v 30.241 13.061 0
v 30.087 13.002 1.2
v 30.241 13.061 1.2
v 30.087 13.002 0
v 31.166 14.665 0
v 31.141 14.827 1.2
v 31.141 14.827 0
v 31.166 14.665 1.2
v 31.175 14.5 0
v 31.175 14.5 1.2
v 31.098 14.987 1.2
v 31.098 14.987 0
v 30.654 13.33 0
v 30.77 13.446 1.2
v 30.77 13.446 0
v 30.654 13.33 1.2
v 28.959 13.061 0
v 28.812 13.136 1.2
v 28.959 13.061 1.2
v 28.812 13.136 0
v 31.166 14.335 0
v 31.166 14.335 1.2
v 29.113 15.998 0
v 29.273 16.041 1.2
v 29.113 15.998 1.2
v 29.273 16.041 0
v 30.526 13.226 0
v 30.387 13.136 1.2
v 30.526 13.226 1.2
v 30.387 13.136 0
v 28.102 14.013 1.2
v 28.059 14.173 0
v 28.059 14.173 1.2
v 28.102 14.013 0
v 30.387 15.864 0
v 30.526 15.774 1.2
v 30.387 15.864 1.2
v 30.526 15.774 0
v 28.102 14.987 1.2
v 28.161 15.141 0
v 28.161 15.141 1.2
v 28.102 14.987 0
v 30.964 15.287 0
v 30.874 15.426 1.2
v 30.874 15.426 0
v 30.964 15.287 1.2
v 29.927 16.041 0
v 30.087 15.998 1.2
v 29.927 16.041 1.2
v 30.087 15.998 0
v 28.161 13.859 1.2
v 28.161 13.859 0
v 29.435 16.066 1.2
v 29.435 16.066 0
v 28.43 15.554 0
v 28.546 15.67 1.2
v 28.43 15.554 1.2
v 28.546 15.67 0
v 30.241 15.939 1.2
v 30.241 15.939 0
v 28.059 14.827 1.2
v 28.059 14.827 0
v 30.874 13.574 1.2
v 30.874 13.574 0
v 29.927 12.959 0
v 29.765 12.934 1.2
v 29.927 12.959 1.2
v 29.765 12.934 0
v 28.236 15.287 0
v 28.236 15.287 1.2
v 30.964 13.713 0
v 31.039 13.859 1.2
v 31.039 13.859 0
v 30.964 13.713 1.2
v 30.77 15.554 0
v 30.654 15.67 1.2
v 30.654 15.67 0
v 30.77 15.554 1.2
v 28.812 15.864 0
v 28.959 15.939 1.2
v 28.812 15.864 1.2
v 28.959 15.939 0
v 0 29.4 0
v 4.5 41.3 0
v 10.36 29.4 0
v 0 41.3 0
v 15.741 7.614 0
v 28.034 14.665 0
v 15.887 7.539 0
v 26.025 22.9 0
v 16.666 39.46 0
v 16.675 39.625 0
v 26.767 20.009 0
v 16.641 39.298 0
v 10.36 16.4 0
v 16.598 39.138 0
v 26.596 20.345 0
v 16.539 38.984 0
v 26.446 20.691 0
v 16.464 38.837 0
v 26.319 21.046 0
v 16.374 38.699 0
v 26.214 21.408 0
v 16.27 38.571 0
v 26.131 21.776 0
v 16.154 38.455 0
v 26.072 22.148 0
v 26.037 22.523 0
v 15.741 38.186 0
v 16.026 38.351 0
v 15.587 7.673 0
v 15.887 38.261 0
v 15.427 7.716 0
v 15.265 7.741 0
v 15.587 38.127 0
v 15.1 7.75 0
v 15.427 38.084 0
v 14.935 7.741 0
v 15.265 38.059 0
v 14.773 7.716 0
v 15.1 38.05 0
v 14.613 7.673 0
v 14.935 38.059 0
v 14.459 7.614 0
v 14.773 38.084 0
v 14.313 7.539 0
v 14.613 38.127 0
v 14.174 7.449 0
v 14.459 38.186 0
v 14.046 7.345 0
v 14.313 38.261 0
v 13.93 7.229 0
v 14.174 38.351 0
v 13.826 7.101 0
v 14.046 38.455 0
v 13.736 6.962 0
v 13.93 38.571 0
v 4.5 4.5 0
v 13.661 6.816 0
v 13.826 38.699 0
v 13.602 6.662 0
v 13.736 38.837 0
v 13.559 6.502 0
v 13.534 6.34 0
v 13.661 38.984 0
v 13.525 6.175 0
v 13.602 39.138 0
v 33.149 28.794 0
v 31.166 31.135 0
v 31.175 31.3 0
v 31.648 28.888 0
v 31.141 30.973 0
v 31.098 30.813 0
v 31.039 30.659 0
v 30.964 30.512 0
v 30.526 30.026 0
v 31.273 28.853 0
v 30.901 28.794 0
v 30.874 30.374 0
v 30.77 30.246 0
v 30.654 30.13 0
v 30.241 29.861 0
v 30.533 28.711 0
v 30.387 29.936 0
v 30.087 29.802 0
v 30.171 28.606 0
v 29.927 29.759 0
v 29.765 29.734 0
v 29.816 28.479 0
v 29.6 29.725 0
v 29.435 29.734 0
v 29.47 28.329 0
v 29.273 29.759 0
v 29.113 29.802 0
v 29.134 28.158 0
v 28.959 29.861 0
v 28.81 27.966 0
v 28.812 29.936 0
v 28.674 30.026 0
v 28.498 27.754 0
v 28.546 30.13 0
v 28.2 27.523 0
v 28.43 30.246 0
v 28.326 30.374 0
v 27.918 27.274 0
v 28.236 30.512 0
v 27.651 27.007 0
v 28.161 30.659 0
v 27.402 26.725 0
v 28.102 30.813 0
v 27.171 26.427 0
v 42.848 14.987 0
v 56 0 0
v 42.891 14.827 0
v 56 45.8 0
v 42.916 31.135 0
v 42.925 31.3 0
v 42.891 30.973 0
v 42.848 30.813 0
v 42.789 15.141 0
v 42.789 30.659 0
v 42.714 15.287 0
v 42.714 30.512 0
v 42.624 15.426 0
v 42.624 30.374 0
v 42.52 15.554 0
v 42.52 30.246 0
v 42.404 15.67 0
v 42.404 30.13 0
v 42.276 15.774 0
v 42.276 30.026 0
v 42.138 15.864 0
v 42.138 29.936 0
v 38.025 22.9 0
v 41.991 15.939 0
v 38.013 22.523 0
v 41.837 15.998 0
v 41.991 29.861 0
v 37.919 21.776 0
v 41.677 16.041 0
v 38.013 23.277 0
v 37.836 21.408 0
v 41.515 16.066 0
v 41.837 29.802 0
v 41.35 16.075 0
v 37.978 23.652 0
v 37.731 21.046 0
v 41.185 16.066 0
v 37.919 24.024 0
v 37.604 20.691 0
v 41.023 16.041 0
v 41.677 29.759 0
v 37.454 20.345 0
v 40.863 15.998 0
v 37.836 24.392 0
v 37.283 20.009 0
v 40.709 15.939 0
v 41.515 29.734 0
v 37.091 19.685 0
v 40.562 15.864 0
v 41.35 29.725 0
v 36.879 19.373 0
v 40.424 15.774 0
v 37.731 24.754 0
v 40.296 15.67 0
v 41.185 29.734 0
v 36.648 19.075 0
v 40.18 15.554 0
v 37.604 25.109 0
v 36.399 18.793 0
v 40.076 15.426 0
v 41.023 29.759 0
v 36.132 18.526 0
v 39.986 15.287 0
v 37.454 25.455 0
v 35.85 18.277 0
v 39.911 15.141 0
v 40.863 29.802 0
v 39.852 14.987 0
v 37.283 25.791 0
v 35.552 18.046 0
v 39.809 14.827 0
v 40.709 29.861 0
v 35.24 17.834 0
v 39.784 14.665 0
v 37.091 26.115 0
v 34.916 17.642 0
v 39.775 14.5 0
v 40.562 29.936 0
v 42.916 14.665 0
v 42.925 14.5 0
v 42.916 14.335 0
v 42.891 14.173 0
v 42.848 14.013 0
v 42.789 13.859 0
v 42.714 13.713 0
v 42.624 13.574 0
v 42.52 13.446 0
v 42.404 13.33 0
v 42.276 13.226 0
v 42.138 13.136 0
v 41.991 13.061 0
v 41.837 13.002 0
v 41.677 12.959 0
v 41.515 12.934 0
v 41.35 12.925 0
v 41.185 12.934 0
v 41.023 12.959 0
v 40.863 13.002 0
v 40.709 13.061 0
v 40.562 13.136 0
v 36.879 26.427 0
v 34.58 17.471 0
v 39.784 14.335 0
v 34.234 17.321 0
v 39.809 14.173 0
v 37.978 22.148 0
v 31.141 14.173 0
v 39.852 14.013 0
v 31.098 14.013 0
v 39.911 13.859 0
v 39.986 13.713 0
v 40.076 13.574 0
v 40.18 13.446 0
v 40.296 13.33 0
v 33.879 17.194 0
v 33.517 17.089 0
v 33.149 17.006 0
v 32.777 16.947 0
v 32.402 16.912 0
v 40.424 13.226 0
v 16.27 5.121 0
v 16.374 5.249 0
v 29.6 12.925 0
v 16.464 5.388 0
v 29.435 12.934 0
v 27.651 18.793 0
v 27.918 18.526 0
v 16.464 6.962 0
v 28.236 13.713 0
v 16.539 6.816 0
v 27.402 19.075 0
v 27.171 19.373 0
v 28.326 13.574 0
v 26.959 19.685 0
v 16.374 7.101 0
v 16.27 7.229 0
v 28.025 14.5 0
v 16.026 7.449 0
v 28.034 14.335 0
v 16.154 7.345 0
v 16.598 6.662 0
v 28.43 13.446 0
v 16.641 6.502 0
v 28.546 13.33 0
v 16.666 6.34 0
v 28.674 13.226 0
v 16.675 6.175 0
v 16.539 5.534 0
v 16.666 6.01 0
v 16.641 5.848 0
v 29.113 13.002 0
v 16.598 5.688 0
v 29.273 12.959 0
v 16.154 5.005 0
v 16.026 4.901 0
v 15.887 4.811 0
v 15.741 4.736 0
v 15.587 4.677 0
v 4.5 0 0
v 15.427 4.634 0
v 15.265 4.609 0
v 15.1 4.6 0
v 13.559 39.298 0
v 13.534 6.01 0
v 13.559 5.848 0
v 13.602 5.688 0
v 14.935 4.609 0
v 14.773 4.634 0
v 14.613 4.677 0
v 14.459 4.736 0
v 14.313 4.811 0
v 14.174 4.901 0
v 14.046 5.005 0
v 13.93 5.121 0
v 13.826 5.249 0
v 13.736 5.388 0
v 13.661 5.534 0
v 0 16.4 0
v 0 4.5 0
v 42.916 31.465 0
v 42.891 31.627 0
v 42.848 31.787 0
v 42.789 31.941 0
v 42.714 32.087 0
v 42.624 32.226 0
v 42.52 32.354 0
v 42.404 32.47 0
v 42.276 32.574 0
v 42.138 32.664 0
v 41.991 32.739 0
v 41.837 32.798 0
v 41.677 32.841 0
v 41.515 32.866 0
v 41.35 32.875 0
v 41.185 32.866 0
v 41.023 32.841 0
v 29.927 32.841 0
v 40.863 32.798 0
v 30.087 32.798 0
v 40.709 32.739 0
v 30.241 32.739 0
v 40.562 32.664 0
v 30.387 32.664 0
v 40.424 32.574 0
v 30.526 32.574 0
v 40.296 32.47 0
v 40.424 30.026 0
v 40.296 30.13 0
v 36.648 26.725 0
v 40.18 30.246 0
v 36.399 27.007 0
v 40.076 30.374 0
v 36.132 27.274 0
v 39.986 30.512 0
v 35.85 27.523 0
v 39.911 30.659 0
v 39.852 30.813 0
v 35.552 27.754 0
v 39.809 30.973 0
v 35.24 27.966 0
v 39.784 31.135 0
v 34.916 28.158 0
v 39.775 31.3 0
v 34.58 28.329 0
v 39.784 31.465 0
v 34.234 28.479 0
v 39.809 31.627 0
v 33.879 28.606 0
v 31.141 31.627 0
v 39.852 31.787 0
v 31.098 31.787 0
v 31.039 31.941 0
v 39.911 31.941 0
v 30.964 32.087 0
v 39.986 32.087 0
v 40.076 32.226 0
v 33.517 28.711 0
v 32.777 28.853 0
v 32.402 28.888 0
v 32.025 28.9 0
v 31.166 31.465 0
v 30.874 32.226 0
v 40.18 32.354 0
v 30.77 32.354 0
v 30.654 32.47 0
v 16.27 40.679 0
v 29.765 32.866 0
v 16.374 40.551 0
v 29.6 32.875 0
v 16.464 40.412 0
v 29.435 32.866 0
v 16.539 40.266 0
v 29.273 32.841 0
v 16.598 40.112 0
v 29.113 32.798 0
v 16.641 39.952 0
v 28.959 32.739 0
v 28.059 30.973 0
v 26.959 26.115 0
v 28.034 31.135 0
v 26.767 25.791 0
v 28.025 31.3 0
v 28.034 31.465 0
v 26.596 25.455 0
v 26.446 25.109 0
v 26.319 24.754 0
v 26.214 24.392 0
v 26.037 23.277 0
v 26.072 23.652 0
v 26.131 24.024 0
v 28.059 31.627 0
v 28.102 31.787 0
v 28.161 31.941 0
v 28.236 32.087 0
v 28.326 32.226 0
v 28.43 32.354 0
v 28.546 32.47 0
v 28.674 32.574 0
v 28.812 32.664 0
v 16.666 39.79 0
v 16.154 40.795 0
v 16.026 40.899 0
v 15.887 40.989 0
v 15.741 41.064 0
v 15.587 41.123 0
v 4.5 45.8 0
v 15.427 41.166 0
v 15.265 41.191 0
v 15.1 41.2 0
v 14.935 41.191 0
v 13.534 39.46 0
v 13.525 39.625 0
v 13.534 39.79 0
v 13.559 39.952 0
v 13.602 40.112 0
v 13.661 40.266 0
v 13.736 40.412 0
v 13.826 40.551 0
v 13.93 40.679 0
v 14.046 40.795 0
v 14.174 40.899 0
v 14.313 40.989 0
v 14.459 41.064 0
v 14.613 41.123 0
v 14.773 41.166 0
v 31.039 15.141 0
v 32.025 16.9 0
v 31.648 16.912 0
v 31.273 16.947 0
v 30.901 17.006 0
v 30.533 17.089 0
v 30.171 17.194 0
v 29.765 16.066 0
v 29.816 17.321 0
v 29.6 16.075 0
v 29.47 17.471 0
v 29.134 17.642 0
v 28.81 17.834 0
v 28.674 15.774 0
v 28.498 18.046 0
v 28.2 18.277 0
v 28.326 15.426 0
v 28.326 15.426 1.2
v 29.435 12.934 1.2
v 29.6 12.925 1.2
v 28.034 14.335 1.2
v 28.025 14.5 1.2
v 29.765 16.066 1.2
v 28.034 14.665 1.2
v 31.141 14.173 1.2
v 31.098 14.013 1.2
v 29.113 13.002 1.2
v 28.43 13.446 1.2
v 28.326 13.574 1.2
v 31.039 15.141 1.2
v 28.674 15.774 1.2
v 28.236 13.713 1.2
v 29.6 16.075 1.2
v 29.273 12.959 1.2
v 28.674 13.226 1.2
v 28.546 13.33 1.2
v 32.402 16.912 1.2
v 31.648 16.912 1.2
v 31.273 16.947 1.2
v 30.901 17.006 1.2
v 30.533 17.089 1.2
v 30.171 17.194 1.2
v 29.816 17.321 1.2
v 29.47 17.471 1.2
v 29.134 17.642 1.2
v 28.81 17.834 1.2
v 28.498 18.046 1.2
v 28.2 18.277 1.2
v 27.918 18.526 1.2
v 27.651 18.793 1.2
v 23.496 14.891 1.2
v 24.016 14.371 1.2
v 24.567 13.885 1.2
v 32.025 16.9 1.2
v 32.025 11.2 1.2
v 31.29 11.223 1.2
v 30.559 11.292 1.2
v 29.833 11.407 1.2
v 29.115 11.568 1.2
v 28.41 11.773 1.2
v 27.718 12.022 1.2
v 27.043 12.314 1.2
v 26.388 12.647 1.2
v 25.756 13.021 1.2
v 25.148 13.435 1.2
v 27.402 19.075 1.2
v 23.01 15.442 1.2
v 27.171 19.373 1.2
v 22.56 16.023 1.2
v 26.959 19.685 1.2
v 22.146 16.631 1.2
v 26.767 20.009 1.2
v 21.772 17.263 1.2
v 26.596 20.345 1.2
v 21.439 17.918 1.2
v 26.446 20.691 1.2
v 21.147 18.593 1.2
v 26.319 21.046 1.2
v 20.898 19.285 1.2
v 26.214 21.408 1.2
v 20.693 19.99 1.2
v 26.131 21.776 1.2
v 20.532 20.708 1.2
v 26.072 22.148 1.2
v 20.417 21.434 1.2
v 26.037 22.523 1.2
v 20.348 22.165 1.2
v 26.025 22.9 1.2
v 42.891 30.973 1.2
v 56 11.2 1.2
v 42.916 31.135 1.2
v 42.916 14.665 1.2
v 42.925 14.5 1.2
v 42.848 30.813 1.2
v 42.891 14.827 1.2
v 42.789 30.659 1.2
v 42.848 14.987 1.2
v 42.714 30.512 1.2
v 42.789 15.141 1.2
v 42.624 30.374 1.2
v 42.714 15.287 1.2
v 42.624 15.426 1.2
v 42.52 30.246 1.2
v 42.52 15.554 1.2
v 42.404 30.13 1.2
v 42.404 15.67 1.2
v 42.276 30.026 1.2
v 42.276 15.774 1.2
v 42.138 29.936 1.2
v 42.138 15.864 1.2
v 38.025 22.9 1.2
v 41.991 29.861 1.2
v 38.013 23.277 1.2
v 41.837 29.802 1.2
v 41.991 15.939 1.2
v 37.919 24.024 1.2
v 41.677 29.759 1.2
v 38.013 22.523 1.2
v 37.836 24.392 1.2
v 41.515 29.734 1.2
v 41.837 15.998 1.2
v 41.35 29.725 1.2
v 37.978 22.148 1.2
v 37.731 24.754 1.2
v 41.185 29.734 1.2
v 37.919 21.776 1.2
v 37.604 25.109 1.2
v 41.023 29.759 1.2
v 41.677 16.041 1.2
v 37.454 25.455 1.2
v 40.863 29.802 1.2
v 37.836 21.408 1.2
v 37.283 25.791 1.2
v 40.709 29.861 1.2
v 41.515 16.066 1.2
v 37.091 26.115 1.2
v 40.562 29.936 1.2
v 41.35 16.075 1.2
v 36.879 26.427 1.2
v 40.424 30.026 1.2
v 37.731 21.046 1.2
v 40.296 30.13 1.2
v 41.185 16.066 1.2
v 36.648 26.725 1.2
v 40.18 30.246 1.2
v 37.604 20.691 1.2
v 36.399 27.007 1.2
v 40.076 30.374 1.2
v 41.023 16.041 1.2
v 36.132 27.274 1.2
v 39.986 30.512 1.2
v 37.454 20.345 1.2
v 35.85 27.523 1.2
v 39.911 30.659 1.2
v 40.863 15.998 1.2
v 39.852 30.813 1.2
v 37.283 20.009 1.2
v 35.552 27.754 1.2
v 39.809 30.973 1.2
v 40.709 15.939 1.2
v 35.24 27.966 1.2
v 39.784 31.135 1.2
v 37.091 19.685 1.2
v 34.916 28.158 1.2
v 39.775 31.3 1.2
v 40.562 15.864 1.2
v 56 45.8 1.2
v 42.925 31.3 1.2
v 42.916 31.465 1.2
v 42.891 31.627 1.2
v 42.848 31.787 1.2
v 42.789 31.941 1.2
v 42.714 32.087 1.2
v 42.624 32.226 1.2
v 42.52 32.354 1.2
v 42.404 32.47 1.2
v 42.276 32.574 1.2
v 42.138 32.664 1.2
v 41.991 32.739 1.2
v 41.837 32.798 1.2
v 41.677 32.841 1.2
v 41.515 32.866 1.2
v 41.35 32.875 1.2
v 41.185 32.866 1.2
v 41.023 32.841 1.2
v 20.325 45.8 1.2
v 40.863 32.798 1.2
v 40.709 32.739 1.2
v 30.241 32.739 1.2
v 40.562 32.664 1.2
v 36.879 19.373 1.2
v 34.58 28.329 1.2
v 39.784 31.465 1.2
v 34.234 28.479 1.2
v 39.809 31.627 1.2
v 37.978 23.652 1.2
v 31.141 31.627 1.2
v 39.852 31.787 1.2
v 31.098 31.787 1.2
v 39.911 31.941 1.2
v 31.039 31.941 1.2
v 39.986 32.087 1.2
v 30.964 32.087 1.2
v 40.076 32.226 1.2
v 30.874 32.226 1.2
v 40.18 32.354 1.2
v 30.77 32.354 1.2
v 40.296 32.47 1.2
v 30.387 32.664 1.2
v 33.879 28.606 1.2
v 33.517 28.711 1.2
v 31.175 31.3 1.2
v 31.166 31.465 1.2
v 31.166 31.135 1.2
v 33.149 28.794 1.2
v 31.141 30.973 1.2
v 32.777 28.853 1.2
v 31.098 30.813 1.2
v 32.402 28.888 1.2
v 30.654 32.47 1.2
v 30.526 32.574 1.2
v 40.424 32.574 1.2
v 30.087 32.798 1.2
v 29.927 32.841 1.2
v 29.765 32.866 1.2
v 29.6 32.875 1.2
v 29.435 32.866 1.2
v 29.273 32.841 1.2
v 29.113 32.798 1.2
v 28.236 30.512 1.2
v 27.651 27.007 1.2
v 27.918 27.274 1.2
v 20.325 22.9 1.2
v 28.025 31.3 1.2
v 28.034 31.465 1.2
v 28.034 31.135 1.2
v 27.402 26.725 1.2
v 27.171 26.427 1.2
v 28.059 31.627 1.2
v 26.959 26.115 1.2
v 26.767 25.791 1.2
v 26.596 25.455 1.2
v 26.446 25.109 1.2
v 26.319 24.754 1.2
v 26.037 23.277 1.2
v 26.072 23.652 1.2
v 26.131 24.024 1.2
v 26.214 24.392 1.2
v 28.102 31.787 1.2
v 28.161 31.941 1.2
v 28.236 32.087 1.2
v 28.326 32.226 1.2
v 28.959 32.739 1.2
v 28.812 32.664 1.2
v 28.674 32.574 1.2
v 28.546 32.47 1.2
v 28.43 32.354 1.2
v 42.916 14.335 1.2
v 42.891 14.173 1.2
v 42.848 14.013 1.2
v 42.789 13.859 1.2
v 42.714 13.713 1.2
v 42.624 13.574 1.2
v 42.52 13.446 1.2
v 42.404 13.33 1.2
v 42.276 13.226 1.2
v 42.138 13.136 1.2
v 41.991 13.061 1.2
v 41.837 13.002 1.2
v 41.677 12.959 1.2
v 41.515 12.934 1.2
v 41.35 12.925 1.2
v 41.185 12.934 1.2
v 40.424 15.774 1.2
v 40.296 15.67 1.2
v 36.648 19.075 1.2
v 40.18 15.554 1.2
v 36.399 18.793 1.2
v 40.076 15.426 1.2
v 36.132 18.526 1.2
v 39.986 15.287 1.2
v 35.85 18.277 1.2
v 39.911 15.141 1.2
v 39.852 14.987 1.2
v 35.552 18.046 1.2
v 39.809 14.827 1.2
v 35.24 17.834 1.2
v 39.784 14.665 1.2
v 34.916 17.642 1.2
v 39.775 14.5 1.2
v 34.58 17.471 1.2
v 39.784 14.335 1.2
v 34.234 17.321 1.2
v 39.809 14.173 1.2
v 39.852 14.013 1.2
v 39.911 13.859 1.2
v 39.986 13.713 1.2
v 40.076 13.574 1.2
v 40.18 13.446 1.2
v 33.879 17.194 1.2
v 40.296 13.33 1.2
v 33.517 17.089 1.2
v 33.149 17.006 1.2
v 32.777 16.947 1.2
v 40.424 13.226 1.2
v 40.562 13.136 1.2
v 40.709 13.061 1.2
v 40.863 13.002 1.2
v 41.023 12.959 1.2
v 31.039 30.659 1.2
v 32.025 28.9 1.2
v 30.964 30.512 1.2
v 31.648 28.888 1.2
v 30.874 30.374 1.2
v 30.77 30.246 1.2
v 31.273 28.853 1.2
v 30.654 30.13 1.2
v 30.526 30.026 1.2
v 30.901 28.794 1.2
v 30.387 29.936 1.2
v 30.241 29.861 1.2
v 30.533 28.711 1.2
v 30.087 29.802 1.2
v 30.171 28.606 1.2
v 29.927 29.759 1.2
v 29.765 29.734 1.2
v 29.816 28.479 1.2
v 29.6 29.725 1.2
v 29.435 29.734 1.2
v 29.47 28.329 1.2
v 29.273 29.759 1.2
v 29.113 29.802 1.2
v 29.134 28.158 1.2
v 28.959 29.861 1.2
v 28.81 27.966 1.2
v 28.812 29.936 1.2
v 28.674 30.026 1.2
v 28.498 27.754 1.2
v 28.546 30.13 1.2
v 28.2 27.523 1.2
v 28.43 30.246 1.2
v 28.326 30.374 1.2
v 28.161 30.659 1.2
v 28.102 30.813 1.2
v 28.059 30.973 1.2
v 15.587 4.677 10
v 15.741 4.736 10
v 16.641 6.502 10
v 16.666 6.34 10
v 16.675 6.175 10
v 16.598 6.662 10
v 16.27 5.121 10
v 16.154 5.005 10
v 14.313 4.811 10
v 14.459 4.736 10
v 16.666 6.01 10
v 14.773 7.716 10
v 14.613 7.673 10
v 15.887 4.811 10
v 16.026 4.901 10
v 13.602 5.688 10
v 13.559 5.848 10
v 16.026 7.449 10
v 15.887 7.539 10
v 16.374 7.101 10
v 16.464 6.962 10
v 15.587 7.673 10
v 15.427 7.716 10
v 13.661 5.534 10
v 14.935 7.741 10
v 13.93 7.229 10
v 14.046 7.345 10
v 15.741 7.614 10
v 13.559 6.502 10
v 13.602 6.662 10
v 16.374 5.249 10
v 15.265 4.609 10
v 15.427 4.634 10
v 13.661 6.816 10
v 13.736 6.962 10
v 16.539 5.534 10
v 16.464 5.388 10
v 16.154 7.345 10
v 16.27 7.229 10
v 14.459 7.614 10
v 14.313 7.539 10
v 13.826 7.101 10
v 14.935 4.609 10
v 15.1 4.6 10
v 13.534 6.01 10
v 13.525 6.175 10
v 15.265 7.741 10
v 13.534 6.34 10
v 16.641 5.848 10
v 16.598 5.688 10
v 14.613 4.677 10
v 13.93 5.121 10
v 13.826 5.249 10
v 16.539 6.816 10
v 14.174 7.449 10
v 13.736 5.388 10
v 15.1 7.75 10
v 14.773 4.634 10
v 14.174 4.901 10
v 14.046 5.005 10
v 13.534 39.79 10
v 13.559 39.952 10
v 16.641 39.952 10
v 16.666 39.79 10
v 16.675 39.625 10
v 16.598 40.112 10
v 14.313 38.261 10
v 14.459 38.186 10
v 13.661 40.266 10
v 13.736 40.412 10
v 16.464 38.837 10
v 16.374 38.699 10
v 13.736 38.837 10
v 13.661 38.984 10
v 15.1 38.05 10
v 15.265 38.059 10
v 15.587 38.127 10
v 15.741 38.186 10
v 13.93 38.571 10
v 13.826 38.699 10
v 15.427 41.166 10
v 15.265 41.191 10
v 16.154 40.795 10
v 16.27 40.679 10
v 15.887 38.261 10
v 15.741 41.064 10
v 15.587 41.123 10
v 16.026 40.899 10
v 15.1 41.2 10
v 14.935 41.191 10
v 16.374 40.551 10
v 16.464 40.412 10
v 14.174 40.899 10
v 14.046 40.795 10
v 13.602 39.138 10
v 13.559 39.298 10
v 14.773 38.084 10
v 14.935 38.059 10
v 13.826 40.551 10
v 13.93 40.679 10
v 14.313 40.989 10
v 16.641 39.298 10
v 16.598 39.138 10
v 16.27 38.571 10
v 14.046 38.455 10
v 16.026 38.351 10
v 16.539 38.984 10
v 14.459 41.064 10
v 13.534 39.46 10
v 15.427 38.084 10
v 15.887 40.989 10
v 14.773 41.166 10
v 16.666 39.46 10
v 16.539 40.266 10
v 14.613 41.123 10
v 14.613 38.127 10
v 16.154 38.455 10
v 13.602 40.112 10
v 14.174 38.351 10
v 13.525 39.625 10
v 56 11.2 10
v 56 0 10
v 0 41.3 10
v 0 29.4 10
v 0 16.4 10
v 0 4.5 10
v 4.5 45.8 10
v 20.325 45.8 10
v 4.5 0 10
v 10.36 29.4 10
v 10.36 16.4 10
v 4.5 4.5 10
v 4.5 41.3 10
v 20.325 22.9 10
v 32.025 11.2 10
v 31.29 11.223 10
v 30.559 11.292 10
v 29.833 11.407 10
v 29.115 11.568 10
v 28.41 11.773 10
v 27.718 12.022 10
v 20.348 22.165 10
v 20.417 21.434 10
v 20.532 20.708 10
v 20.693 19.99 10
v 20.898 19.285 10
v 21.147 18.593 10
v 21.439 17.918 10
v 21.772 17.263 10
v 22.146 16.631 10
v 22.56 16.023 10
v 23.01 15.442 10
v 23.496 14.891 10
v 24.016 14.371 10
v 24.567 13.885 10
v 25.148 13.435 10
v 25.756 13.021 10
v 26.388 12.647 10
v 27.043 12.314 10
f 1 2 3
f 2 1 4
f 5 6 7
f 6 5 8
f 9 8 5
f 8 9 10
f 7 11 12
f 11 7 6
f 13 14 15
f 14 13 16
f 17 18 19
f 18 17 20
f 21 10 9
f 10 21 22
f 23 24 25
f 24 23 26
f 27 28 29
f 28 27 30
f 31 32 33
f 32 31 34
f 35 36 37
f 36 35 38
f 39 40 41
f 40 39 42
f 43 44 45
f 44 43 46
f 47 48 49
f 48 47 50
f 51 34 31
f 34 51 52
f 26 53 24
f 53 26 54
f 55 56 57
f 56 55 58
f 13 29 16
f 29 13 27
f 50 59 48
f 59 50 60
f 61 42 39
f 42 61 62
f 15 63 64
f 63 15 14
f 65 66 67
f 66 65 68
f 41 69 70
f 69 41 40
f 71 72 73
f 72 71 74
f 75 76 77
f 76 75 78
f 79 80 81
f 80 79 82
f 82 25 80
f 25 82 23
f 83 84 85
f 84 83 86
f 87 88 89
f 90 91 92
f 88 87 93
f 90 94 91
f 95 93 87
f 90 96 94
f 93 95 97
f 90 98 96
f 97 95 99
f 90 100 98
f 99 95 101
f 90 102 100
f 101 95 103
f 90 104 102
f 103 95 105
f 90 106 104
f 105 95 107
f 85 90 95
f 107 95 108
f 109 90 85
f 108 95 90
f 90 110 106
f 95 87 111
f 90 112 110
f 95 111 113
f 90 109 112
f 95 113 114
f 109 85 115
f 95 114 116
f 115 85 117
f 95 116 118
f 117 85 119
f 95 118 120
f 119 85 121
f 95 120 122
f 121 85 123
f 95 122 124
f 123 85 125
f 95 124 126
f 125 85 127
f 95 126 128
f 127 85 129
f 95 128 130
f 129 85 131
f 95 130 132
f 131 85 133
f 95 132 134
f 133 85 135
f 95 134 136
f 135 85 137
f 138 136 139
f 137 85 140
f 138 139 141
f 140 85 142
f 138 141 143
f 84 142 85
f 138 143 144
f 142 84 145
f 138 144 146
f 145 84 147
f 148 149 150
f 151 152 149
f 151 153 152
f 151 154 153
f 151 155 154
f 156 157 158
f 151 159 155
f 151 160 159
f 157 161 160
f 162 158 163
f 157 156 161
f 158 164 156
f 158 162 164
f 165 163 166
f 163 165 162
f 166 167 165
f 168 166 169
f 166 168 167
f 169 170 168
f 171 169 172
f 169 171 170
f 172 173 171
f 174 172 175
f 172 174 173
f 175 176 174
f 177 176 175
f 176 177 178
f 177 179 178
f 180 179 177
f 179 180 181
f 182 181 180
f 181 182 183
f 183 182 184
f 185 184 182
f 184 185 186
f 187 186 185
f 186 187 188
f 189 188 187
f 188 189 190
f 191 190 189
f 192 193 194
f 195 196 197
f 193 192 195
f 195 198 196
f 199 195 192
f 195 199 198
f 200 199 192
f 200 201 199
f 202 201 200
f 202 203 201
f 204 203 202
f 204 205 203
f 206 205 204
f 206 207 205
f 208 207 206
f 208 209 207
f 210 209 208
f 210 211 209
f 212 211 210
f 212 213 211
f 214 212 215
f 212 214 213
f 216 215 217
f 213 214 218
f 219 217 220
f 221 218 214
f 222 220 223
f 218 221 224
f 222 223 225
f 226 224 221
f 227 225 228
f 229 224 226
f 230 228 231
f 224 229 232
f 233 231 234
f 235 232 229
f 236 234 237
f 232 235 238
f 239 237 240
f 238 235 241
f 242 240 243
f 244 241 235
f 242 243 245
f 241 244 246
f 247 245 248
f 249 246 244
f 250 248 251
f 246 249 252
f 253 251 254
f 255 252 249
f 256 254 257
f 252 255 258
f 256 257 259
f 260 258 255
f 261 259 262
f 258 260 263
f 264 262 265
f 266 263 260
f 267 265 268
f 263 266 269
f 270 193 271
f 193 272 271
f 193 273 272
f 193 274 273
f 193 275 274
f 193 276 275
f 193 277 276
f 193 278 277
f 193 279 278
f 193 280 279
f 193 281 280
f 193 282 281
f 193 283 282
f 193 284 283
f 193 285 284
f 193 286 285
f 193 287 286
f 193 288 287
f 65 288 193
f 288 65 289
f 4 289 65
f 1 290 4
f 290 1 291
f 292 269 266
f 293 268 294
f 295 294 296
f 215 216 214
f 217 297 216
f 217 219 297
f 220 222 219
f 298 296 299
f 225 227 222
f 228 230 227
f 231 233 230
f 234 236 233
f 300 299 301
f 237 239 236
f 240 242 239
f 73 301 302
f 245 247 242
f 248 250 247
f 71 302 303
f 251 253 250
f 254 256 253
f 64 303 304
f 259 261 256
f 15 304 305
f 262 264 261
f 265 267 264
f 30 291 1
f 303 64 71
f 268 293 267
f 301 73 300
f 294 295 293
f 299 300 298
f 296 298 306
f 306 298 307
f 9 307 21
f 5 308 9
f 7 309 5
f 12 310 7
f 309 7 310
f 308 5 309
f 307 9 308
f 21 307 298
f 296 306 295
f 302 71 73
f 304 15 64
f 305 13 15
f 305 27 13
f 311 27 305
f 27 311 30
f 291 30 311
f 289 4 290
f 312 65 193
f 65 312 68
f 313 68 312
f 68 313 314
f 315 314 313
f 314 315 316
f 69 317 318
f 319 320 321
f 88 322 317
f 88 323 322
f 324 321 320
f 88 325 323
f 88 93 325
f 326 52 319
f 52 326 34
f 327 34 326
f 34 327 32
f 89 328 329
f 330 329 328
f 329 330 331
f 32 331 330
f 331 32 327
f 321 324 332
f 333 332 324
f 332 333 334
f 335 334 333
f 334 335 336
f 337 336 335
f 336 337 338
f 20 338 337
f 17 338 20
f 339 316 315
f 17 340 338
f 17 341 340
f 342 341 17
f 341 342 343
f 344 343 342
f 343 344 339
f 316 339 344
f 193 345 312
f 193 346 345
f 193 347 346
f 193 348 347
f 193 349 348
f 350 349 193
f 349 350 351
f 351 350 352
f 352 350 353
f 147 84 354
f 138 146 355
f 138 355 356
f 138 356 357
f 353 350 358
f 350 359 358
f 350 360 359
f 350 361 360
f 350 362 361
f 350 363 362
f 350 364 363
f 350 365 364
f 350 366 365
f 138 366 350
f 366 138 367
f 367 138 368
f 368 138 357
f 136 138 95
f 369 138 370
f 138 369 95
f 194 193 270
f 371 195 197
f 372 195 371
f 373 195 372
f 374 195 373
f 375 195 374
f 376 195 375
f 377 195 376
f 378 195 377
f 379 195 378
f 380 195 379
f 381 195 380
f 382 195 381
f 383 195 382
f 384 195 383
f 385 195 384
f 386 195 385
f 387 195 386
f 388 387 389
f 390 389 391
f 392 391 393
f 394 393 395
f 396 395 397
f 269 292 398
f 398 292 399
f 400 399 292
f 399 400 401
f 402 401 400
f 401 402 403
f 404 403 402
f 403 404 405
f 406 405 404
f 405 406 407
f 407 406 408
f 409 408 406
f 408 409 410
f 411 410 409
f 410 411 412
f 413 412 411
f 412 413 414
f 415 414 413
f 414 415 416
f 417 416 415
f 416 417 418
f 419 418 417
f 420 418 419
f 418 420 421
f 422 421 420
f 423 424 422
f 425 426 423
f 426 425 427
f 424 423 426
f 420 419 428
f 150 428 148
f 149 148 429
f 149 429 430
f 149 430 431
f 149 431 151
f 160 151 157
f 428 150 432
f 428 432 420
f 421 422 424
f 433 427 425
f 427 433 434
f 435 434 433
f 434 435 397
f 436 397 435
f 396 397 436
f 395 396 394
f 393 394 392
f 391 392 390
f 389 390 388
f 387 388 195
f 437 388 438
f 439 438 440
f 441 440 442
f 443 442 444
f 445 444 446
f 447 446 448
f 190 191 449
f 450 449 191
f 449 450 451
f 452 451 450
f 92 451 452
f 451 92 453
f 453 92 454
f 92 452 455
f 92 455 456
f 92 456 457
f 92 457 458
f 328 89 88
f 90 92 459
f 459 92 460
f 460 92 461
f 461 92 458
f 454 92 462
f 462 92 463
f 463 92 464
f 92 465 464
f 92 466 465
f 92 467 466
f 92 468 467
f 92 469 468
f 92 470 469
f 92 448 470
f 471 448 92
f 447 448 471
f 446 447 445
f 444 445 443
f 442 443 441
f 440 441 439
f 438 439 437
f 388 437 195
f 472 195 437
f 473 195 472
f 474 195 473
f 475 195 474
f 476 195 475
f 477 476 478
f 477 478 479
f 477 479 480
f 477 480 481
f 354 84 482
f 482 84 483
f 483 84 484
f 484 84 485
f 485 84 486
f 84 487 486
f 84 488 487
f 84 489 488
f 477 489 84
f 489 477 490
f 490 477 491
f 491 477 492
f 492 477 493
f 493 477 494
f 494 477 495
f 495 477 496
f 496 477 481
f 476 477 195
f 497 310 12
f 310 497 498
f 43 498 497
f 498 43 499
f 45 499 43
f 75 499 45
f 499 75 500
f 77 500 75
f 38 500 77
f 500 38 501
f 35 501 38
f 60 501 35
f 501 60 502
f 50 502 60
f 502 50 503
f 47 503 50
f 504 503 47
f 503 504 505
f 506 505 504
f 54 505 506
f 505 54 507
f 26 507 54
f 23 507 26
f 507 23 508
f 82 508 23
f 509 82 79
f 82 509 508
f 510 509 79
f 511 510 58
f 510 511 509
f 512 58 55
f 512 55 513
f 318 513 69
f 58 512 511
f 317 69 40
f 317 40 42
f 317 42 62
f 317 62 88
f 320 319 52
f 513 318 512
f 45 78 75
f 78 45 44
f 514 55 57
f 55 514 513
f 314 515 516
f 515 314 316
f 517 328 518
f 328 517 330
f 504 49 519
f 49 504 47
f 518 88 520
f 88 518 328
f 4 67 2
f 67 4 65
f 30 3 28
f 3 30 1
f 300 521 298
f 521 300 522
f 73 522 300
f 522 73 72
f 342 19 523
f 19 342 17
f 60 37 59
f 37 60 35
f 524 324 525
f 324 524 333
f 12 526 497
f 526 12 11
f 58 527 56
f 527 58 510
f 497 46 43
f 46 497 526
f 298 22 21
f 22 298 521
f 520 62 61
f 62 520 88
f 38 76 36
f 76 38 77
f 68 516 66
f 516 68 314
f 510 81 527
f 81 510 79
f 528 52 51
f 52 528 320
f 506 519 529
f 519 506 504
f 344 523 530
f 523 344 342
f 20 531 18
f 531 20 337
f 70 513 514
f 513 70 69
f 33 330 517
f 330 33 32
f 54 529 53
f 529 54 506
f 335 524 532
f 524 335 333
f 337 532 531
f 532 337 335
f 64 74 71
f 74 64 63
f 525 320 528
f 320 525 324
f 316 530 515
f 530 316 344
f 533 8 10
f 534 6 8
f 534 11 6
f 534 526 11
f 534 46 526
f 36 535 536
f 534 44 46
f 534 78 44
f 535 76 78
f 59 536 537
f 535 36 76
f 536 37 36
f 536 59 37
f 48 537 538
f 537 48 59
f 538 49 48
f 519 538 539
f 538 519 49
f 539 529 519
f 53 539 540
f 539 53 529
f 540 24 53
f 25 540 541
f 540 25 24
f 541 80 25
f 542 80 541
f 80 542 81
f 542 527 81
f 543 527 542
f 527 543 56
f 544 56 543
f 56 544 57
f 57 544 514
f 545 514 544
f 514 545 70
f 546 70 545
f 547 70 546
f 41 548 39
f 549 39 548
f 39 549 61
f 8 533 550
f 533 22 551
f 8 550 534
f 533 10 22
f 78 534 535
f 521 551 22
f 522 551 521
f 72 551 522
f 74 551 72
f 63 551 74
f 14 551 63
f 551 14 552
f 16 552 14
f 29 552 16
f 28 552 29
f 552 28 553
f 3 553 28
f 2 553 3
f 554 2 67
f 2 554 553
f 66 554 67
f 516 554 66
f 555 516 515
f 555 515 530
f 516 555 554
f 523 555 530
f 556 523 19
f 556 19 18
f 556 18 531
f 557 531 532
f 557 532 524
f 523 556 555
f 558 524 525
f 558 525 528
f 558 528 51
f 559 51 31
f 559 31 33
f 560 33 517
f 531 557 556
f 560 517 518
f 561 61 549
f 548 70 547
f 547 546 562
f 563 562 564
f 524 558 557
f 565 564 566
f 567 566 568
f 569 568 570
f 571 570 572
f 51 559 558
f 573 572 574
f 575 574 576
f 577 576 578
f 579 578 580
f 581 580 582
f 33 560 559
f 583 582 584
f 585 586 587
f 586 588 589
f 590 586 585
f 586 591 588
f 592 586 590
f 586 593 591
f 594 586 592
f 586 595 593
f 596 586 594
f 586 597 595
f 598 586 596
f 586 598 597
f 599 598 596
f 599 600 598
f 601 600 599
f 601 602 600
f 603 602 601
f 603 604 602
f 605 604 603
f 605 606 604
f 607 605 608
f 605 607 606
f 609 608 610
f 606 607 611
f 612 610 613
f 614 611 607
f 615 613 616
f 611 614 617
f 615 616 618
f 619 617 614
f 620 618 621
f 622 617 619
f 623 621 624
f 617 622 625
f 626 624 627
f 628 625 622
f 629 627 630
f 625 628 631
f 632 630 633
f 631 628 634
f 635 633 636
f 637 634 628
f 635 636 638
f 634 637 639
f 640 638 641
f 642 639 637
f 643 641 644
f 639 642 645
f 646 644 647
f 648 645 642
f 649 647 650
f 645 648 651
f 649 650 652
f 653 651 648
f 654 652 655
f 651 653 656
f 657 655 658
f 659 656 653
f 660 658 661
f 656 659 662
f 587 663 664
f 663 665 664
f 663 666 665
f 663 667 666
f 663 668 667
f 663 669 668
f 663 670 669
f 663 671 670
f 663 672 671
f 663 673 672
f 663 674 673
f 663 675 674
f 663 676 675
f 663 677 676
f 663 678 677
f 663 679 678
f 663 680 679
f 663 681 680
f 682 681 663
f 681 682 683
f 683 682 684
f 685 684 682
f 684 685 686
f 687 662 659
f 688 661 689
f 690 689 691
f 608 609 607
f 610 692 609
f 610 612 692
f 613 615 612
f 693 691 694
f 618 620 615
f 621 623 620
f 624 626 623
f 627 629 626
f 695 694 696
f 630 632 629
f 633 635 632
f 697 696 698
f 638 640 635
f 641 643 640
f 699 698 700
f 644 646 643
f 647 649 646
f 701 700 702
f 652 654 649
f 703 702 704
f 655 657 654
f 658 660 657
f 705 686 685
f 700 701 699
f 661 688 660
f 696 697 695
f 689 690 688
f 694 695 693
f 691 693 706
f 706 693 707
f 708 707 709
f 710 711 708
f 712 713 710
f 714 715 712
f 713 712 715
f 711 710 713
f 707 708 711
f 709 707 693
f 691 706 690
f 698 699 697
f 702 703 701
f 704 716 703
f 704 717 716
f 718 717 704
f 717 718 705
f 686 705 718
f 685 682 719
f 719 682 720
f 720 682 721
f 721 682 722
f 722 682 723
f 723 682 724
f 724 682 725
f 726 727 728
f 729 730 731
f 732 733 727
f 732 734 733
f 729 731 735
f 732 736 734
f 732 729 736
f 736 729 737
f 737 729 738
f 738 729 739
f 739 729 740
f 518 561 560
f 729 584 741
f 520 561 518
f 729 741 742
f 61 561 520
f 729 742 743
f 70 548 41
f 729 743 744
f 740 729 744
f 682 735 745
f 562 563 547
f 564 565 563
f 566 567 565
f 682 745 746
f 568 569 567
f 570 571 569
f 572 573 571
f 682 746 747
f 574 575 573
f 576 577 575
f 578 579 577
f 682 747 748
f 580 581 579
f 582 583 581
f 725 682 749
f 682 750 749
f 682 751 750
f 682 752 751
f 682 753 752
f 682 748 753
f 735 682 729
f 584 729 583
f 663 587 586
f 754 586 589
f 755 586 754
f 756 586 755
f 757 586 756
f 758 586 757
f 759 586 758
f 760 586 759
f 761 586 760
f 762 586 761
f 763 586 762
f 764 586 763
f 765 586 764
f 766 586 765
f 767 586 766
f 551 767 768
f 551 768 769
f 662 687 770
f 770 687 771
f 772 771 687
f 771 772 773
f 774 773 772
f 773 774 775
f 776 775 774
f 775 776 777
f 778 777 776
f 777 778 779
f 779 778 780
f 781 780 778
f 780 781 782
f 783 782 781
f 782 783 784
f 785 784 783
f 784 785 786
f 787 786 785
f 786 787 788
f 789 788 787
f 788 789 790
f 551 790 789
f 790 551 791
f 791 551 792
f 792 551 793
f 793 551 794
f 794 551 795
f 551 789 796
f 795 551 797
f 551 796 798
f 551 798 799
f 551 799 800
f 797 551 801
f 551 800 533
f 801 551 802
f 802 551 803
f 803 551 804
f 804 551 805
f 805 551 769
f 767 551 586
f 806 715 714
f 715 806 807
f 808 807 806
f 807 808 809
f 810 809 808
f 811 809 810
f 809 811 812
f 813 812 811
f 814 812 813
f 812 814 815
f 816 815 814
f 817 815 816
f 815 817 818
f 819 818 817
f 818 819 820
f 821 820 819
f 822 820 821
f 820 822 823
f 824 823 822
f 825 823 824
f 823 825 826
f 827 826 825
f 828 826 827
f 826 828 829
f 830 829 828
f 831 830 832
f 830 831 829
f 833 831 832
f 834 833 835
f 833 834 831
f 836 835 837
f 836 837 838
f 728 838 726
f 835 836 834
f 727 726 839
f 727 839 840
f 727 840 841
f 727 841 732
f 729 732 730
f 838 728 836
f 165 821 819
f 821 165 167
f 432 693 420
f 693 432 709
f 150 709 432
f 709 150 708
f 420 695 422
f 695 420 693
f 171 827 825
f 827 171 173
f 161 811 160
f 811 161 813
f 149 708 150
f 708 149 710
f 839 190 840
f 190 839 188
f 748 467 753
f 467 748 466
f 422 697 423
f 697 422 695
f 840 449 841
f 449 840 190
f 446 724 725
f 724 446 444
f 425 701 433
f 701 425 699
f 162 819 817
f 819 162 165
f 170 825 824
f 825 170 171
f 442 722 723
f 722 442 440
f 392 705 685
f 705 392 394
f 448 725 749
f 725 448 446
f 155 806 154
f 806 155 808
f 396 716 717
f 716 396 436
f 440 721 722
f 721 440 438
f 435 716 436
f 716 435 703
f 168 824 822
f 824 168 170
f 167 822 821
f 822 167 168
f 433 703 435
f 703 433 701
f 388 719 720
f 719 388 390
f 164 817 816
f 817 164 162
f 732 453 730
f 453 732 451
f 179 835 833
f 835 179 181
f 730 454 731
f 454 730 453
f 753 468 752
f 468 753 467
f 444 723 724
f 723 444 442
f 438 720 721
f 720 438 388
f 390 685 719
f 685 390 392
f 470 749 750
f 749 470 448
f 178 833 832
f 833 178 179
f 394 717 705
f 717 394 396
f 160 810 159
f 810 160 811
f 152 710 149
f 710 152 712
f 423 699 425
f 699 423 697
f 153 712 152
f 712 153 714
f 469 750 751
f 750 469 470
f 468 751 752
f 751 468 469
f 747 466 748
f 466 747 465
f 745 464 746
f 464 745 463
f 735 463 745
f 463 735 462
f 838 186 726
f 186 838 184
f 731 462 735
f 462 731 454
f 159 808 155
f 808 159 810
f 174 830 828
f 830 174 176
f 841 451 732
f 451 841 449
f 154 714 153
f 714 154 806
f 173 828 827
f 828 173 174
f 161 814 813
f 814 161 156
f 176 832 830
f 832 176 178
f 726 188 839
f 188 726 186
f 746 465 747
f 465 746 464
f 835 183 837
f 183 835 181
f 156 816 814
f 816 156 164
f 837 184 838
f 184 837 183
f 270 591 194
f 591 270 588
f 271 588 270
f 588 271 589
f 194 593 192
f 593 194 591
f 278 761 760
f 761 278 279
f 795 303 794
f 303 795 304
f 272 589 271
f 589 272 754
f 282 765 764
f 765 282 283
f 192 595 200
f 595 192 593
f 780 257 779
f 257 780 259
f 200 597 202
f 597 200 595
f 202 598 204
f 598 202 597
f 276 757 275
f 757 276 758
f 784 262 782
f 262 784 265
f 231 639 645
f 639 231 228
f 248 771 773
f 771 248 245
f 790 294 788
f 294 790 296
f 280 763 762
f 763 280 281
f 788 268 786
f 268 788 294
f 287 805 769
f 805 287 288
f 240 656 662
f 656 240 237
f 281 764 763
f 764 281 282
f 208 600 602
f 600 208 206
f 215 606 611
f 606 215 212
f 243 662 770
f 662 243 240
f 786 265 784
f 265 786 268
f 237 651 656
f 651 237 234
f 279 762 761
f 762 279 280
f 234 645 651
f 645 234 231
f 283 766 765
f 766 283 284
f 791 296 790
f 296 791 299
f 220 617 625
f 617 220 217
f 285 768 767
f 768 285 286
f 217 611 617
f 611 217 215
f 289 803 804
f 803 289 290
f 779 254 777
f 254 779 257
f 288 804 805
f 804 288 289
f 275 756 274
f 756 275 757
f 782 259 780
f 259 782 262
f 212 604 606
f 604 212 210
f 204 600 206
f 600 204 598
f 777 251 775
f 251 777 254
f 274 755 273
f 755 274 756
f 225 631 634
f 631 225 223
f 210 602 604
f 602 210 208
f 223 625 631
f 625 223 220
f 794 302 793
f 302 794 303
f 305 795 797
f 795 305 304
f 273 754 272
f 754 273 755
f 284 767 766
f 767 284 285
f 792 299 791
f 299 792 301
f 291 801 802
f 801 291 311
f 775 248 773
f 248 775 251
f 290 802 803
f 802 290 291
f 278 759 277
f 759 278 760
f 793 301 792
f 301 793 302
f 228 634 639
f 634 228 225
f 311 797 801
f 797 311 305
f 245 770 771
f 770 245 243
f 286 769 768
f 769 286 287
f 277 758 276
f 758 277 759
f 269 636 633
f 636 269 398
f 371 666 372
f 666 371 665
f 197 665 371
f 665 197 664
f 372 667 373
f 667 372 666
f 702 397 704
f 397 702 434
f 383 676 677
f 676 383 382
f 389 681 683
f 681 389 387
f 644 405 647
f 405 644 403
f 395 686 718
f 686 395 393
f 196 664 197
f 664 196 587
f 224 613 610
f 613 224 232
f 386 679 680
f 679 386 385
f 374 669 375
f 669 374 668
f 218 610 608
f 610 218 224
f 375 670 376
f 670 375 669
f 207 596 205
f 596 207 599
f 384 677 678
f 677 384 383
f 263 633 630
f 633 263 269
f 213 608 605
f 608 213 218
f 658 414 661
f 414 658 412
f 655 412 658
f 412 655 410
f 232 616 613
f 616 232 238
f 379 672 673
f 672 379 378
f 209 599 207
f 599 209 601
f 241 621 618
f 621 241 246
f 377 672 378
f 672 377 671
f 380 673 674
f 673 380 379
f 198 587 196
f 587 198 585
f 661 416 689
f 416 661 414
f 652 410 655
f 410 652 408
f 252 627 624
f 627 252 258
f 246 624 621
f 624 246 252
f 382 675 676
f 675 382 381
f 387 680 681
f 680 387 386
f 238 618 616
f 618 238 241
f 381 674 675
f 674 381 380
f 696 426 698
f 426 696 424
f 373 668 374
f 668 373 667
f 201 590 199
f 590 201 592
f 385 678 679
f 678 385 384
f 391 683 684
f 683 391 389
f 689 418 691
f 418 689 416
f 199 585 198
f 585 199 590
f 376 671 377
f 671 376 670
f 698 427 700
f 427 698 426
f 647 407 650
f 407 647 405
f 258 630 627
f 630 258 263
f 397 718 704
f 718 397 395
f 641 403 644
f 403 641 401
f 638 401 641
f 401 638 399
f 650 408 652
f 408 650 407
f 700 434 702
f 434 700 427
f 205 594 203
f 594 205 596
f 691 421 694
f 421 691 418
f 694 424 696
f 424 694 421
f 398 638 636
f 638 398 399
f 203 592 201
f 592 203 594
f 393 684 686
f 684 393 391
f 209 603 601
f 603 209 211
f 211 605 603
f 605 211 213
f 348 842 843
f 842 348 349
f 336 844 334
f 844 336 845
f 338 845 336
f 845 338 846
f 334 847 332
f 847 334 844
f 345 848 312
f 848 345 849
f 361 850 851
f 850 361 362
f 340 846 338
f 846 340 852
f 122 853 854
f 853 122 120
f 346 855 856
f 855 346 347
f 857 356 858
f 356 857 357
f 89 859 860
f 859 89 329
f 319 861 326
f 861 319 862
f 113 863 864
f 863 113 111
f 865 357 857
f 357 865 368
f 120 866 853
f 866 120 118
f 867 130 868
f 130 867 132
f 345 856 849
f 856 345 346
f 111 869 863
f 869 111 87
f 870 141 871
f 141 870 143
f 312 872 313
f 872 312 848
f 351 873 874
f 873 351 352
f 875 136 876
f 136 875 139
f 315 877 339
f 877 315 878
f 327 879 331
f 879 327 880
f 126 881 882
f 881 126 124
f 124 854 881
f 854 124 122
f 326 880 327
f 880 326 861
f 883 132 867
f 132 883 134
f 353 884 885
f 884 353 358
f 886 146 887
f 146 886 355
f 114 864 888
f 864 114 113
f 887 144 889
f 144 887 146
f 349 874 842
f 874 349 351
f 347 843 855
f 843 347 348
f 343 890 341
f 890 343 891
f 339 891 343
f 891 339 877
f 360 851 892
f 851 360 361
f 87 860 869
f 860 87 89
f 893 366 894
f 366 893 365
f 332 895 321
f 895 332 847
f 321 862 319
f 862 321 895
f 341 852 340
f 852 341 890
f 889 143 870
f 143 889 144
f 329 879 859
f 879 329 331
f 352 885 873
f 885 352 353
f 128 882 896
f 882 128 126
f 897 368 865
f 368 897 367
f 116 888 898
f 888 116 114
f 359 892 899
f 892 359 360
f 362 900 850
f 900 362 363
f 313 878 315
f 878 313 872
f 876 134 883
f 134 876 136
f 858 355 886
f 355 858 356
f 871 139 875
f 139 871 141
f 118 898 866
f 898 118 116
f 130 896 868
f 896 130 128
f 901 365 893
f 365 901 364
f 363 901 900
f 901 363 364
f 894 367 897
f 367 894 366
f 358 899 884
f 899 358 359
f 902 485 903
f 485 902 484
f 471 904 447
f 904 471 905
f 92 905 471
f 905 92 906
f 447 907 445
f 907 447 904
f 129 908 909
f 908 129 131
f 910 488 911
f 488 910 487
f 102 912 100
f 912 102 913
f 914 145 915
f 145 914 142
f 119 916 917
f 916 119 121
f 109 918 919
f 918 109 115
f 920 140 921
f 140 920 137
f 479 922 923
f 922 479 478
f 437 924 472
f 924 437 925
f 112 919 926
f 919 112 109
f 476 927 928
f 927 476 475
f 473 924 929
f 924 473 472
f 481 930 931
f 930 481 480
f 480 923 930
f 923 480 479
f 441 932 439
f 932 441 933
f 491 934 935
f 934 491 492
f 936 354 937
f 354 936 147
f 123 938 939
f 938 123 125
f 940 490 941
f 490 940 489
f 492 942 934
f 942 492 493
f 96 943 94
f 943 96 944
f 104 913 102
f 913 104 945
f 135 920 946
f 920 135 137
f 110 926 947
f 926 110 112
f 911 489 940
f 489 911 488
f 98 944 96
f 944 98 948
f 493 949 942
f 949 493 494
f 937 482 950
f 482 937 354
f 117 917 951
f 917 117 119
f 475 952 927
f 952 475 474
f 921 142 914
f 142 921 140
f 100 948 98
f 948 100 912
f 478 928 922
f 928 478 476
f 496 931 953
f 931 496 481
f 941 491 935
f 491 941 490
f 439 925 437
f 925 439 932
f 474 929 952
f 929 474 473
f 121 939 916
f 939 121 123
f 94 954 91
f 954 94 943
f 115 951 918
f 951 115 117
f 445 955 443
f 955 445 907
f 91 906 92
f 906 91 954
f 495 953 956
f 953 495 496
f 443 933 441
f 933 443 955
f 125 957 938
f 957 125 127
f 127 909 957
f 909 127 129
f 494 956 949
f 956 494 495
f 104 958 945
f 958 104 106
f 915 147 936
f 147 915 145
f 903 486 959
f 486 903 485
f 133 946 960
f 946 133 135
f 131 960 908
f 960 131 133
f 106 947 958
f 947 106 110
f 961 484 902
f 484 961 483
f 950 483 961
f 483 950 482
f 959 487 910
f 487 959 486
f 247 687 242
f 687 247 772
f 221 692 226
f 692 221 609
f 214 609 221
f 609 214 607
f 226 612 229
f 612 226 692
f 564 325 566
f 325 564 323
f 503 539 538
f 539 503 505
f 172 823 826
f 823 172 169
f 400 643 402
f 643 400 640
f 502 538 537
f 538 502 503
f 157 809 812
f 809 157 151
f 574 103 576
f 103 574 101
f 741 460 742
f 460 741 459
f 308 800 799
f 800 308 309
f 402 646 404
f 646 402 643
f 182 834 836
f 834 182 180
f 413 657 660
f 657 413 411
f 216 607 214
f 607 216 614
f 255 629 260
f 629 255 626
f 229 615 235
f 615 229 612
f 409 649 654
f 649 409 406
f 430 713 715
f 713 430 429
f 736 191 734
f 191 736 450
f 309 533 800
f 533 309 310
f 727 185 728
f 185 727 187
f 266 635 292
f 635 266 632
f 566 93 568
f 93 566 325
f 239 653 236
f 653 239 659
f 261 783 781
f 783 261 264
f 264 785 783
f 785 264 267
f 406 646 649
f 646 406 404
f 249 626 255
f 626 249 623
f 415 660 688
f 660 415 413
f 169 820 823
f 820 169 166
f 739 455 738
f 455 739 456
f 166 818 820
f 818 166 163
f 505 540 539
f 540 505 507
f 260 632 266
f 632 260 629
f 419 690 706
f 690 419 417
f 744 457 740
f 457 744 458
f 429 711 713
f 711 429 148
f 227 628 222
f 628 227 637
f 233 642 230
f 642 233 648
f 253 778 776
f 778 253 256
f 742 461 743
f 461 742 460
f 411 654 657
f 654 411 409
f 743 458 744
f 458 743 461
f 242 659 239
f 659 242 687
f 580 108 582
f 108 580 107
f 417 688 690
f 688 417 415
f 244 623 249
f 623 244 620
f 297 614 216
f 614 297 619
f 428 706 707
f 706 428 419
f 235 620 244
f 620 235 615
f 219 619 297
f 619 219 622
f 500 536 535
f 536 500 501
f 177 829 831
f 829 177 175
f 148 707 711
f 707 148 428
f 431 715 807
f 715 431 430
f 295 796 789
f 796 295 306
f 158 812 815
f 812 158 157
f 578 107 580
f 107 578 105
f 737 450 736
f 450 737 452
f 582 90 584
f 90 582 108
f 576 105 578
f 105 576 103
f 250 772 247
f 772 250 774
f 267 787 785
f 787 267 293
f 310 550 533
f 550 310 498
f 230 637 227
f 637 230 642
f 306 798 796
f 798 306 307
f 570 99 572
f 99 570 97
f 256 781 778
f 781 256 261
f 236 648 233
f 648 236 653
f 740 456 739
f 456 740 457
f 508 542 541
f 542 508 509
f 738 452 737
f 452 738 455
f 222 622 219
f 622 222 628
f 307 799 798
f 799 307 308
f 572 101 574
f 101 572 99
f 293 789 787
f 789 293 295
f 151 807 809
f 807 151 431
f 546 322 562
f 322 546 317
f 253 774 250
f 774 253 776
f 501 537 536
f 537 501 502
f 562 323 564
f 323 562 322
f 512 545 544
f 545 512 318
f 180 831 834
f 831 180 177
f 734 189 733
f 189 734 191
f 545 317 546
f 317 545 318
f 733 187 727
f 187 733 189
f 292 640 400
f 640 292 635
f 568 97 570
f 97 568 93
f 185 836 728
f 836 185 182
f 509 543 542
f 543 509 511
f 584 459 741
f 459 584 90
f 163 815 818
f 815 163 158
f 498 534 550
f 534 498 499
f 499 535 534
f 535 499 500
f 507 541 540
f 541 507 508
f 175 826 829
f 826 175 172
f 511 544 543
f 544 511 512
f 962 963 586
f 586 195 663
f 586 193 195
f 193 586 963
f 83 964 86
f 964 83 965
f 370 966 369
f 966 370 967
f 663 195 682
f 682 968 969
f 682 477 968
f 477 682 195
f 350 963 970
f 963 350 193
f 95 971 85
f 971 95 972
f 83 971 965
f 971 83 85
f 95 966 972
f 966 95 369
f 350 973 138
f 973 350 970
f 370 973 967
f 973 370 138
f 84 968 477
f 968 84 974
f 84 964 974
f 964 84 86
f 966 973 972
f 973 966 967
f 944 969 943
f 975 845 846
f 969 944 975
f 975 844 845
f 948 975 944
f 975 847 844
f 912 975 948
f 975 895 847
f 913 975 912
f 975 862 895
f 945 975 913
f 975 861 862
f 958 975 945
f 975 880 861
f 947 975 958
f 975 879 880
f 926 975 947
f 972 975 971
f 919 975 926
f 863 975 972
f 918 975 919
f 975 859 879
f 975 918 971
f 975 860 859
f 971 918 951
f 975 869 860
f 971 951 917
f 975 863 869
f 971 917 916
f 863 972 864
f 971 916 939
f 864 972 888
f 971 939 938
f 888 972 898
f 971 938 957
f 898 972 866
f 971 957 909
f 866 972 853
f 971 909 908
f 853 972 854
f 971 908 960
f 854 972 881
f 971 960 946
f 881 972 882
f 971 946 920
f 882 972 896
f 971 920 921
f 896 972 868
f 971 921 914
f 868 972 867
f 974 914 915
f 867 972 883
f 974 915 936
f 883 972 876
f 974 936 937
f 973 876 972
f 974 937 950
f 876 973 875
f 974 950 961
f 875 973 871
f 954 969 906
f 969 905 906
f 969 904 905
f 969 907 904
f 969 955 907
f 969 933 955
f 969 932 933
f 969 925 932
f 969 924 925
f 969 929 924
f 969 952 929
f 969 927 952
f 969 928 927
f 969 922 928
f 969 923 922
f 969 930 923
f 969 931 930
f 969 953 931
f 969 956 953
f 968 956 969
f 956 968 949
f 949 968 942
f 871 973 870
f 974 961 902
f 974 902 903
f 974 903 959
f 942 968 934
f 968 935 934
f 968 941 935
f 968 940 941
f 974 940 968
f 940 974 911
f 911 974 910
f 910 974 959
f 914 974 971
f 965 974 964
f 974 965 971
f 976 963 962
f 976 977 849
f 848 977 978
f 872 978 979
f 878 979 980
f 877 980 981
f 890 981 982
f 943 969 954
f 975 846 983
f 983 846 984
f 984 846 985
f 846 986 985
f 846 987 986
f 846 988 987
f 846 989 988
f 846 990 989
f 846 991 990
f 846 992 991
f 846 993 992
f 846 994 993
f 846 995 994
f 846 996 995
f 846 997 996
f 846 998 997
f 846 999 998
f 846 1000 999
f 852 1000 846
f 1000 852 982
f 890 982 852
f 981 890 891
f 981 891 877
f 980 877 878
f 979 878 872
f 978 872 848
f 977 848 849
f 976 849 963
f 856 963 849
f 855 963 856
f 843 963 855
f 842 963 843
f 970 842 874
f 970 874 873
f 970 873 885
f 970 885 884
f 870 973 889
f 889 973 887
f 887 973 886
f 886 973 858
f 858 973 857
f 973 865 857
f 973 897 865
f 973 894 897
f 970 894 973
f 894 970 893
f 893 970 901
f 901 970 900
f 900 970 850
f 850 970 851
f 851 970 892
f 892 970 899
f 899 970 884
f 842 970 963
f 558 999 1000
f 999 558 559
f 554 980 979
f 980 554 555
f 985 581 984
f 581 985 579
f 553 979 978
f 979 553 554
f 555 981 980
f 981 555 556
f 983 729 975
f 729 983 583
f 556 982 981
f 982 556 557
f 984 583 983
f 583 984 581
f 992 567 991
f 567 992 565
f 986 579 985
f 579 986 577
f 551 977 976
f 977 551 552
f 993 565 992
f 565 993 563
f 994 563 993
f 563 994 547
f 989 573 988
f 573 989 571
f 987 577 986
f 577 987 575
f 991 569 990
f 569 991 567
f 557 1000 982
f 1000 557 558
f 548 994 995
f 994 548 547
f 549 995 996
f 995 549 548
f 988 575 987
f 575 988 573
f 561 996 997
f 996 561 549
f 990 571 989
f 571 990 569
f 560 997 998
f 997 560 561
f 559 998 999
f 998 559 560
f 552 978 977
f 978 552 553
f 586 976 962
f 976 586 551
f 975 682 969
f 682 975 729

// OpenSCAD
$fn = 20;

mainPlateThickness = 1.2;
mainPlateDimensions = [56, 45.8, mainPlateThickness];
usbDimensions = [10.36, 13, mainPlateThickness];

// final dimensions
pairHoleYGap = 33.45; // pair of holes near the usb slot
//pairHoleEdgeXOffset = 14.4; // from the top edge to the pair of holes (deprecated)
pairQuadHoleXGap = 14.5; // from the hole pair to the top left of quad // version = [15.15]

// absolute distance from the far edge to the reference top left hole near the big one, measured 29.55, rounded to 29.6
holeAssemblyXEdgeOffset = 29.6;

//all measured from the outer edge of mainPlate
wideHoleYOffset = 4.5;
narrowHoleYOffset = 12.8;
bigHoleYOffset = 16.85;

// main plate shoulder cuts
shoulderDimensions=[4.5,4.5];

module mainPlate(dPlate=mainPlateDimensions, dUsb=usbDimensions, db=bigDia, dsp=smallDia, dsq=smallDia, h=mainPlateDimensions[2], sd=shoulderDimensions) {
    difference() {
        cube([dPlate[0], dPlate[1], h]);
        // usb slot
        translate([0,(dPlate[1]-dUsb[1])/2,0]) 
            cube([dUsb[0], dUsb[1], h]);
        // cutout on the shoulders
            cube([sd[0],sd[1],h]);
        translate([0,dPlate[1]-4.5,0]) 
            cube([sd[0],sd[1],h]);
        // hole Assembly
        translate([holeAssemblyXEdgeOffset,(dPlate[1]-quadHoleGaps[1])/2,0])
            holeAssembly(h=h, db=db) { 
                holeSet(d=dsq, h=h);  // for the quad holes
                holeSet(d=dsp, gapMatrix=[0, pairHoleYGap], h=h); // pair of holes
            };
    };
};
//mainPlate();

// Final Dimensions
smallDia = 3.15;
quadHoleGaps = [11.75, 16.8]; // [xGap, yGap]
module holeSet(h=mainPlateThickness, gapMatrix=quadHoleGaps, d=smallDia) {
    for ( x=[0, gapMatrix[0]], y=[0, gapMatrix[1]] ) {
        translate([x,y,0]) cylinder(d=d, h=h, $fn=60);
    };
};

// origin is the near top left hole from the big one
bigDia = 12;
bigHoleOffset = [2.425, quadHoleGaps[1]/2];
module holeAssembly(h=mainPlateThickness, db=bigDia, bigOff=bigHoleOffset, ds=smallDia, pairQuadGap=pairQuadHoleXGap) {
    children(0); // holeSet for the four holes;
    translate([-pairQuadGap, (-pairHoleYGap+quadHoleGaps[1])/2, 0])
        children(1); // holeSet(gapMatrix=[0, pairHoleYGap]); for the pair
    translate([bigOff[0],bigOff[1],0]) cylinder(d=db, h=h, $fn=100); // coupler hole
};
/* holeAssembly() { */ 
/*     holeSet(); */ 
/*     holeSet(gapMatrix=[0, pairHoleYGap]); */
/* }; */

capDiameter = 6.5; // head of the hex screw
dCoupler = 26.4 - 3; // outer diameter and then some of the ptfe coupler
totalHeight = 10; // this is the target height for the riser plus baseplate
// these offsets exist so I can place the cutout on top of the main plate hole assembly
//couplerHoleXOffset = bigHoleOffset[0] + holeAssemblyXEdgeOffset;
//couplerHoleYOffset = (mainPlateDimensions[1]-dCoupler)/2;
couplerHoleXOffset = bigHoleOffset[0] + holeAssemblyXEdgeOffset;
couplerHoleYOffset = (mainPlateDimensions[1]-dCoupler)/2;
//echo(couplerHoleXOffset, couplerHoleYOffset);

// for perpendicular alignment of coupler to stepper shaft
filamentD=1.75;
filamentH=50;
module riserPlate(mainD=mainPlateDimensions, rh=totalHeight, dc=capDiameter, db=dCoupler, cxoff=couplerHoleXOffset, cyoff=couplerHoleYOffset, filament=false, filamentD=filamentD, filamentH=filamentH) {
// basically the main plate but has a cutout in front
    difference() {
        // dsq is diameter of the four holes, i set this separate from the pair defined by dsp
        // para hindi makain 'yung wall sa kaliwa ni top left quad, same lang ang riser hole diameter sa main
        mainPlate(dsq=smallDia, dsp=smallDia, h=rh, db=db); // smallDia on dsp becasue cap diameter doesn't matter up topanymore
        // cube cutout below (-x) coupler hole
        translate([cxoff, cyoff, 0]) 
            cube([mainD[0]-cxoff, db, rh]);
        rightCutoutDimensions=[mainD[0]-(cxoff-db/2),mainD[1]/2,rh];
        translate([cxoff-db/2, rightCutoutDimensions[1], 0])
            cube(rightCutoutDimensions);
    };
    echo("couplerYOffset+db/2", cyoff+db/2);
    echo("couplerXOffset", cxoff);
    if (filament) { translate([cxoff, cyoff+db/2, 0]) cylinder(h=filamentH, d=filamentD); };
};
//riserPlate();

/* couplerHoleXOffset = bigHoleOffset[0] + holeAssemblyXEdgeOffset; */
/* couplerHoleYOffset = (mainPlateDimensions[1]-dCoupler)/2; */
/* //echo(couplerHoleXOffset, couplerHoleYOffset); */

/* // for perpendicular alignment of coupler to stepper shaft */
/* filamentD=1.75; */
/* filamentH=50; */
/* module riserPlate(mainD=mainPlateDimensions, rh=totalHeight, dc=capDiameter, db=dCoupler, cxoff=couplerHoleXOffset, cyoff=couplerHoleYOffset, filament=false, filamentD=filamentD, filamentH=filamentH) { */

// combined mainPlate and riserPlate here
module topPlate(dPlate=mainPlateDimensions, rh=totalHeight, dc=capDiameter, db=dCoupler, filament=false, filamentD=filamentD, filamentH=filamentH, cxoff=couplerHoleXOffset, cyoff=couplerHoleYOffset) {
    // if I want to edit this, I won't do it in the assembly, I'll go here and change it, besides, main plate dimensions are already correct
    mainPlate();
    // difference with the riser plate is I might want to lower the height, change the cap diameter, or decide to enlarge/shrink the coupler hole
    // params are my design choices versus the main plate's whose features depend on the actual aluminum plate where the hotend's mounted
    riserPlate(rh=rh, dc=dc, db=db, filament=filament, filamentD=filamentD, filamentH=filamentH, cxoff=cxoff, cyoff=cyoff);
};
topPlate(filament=false);
